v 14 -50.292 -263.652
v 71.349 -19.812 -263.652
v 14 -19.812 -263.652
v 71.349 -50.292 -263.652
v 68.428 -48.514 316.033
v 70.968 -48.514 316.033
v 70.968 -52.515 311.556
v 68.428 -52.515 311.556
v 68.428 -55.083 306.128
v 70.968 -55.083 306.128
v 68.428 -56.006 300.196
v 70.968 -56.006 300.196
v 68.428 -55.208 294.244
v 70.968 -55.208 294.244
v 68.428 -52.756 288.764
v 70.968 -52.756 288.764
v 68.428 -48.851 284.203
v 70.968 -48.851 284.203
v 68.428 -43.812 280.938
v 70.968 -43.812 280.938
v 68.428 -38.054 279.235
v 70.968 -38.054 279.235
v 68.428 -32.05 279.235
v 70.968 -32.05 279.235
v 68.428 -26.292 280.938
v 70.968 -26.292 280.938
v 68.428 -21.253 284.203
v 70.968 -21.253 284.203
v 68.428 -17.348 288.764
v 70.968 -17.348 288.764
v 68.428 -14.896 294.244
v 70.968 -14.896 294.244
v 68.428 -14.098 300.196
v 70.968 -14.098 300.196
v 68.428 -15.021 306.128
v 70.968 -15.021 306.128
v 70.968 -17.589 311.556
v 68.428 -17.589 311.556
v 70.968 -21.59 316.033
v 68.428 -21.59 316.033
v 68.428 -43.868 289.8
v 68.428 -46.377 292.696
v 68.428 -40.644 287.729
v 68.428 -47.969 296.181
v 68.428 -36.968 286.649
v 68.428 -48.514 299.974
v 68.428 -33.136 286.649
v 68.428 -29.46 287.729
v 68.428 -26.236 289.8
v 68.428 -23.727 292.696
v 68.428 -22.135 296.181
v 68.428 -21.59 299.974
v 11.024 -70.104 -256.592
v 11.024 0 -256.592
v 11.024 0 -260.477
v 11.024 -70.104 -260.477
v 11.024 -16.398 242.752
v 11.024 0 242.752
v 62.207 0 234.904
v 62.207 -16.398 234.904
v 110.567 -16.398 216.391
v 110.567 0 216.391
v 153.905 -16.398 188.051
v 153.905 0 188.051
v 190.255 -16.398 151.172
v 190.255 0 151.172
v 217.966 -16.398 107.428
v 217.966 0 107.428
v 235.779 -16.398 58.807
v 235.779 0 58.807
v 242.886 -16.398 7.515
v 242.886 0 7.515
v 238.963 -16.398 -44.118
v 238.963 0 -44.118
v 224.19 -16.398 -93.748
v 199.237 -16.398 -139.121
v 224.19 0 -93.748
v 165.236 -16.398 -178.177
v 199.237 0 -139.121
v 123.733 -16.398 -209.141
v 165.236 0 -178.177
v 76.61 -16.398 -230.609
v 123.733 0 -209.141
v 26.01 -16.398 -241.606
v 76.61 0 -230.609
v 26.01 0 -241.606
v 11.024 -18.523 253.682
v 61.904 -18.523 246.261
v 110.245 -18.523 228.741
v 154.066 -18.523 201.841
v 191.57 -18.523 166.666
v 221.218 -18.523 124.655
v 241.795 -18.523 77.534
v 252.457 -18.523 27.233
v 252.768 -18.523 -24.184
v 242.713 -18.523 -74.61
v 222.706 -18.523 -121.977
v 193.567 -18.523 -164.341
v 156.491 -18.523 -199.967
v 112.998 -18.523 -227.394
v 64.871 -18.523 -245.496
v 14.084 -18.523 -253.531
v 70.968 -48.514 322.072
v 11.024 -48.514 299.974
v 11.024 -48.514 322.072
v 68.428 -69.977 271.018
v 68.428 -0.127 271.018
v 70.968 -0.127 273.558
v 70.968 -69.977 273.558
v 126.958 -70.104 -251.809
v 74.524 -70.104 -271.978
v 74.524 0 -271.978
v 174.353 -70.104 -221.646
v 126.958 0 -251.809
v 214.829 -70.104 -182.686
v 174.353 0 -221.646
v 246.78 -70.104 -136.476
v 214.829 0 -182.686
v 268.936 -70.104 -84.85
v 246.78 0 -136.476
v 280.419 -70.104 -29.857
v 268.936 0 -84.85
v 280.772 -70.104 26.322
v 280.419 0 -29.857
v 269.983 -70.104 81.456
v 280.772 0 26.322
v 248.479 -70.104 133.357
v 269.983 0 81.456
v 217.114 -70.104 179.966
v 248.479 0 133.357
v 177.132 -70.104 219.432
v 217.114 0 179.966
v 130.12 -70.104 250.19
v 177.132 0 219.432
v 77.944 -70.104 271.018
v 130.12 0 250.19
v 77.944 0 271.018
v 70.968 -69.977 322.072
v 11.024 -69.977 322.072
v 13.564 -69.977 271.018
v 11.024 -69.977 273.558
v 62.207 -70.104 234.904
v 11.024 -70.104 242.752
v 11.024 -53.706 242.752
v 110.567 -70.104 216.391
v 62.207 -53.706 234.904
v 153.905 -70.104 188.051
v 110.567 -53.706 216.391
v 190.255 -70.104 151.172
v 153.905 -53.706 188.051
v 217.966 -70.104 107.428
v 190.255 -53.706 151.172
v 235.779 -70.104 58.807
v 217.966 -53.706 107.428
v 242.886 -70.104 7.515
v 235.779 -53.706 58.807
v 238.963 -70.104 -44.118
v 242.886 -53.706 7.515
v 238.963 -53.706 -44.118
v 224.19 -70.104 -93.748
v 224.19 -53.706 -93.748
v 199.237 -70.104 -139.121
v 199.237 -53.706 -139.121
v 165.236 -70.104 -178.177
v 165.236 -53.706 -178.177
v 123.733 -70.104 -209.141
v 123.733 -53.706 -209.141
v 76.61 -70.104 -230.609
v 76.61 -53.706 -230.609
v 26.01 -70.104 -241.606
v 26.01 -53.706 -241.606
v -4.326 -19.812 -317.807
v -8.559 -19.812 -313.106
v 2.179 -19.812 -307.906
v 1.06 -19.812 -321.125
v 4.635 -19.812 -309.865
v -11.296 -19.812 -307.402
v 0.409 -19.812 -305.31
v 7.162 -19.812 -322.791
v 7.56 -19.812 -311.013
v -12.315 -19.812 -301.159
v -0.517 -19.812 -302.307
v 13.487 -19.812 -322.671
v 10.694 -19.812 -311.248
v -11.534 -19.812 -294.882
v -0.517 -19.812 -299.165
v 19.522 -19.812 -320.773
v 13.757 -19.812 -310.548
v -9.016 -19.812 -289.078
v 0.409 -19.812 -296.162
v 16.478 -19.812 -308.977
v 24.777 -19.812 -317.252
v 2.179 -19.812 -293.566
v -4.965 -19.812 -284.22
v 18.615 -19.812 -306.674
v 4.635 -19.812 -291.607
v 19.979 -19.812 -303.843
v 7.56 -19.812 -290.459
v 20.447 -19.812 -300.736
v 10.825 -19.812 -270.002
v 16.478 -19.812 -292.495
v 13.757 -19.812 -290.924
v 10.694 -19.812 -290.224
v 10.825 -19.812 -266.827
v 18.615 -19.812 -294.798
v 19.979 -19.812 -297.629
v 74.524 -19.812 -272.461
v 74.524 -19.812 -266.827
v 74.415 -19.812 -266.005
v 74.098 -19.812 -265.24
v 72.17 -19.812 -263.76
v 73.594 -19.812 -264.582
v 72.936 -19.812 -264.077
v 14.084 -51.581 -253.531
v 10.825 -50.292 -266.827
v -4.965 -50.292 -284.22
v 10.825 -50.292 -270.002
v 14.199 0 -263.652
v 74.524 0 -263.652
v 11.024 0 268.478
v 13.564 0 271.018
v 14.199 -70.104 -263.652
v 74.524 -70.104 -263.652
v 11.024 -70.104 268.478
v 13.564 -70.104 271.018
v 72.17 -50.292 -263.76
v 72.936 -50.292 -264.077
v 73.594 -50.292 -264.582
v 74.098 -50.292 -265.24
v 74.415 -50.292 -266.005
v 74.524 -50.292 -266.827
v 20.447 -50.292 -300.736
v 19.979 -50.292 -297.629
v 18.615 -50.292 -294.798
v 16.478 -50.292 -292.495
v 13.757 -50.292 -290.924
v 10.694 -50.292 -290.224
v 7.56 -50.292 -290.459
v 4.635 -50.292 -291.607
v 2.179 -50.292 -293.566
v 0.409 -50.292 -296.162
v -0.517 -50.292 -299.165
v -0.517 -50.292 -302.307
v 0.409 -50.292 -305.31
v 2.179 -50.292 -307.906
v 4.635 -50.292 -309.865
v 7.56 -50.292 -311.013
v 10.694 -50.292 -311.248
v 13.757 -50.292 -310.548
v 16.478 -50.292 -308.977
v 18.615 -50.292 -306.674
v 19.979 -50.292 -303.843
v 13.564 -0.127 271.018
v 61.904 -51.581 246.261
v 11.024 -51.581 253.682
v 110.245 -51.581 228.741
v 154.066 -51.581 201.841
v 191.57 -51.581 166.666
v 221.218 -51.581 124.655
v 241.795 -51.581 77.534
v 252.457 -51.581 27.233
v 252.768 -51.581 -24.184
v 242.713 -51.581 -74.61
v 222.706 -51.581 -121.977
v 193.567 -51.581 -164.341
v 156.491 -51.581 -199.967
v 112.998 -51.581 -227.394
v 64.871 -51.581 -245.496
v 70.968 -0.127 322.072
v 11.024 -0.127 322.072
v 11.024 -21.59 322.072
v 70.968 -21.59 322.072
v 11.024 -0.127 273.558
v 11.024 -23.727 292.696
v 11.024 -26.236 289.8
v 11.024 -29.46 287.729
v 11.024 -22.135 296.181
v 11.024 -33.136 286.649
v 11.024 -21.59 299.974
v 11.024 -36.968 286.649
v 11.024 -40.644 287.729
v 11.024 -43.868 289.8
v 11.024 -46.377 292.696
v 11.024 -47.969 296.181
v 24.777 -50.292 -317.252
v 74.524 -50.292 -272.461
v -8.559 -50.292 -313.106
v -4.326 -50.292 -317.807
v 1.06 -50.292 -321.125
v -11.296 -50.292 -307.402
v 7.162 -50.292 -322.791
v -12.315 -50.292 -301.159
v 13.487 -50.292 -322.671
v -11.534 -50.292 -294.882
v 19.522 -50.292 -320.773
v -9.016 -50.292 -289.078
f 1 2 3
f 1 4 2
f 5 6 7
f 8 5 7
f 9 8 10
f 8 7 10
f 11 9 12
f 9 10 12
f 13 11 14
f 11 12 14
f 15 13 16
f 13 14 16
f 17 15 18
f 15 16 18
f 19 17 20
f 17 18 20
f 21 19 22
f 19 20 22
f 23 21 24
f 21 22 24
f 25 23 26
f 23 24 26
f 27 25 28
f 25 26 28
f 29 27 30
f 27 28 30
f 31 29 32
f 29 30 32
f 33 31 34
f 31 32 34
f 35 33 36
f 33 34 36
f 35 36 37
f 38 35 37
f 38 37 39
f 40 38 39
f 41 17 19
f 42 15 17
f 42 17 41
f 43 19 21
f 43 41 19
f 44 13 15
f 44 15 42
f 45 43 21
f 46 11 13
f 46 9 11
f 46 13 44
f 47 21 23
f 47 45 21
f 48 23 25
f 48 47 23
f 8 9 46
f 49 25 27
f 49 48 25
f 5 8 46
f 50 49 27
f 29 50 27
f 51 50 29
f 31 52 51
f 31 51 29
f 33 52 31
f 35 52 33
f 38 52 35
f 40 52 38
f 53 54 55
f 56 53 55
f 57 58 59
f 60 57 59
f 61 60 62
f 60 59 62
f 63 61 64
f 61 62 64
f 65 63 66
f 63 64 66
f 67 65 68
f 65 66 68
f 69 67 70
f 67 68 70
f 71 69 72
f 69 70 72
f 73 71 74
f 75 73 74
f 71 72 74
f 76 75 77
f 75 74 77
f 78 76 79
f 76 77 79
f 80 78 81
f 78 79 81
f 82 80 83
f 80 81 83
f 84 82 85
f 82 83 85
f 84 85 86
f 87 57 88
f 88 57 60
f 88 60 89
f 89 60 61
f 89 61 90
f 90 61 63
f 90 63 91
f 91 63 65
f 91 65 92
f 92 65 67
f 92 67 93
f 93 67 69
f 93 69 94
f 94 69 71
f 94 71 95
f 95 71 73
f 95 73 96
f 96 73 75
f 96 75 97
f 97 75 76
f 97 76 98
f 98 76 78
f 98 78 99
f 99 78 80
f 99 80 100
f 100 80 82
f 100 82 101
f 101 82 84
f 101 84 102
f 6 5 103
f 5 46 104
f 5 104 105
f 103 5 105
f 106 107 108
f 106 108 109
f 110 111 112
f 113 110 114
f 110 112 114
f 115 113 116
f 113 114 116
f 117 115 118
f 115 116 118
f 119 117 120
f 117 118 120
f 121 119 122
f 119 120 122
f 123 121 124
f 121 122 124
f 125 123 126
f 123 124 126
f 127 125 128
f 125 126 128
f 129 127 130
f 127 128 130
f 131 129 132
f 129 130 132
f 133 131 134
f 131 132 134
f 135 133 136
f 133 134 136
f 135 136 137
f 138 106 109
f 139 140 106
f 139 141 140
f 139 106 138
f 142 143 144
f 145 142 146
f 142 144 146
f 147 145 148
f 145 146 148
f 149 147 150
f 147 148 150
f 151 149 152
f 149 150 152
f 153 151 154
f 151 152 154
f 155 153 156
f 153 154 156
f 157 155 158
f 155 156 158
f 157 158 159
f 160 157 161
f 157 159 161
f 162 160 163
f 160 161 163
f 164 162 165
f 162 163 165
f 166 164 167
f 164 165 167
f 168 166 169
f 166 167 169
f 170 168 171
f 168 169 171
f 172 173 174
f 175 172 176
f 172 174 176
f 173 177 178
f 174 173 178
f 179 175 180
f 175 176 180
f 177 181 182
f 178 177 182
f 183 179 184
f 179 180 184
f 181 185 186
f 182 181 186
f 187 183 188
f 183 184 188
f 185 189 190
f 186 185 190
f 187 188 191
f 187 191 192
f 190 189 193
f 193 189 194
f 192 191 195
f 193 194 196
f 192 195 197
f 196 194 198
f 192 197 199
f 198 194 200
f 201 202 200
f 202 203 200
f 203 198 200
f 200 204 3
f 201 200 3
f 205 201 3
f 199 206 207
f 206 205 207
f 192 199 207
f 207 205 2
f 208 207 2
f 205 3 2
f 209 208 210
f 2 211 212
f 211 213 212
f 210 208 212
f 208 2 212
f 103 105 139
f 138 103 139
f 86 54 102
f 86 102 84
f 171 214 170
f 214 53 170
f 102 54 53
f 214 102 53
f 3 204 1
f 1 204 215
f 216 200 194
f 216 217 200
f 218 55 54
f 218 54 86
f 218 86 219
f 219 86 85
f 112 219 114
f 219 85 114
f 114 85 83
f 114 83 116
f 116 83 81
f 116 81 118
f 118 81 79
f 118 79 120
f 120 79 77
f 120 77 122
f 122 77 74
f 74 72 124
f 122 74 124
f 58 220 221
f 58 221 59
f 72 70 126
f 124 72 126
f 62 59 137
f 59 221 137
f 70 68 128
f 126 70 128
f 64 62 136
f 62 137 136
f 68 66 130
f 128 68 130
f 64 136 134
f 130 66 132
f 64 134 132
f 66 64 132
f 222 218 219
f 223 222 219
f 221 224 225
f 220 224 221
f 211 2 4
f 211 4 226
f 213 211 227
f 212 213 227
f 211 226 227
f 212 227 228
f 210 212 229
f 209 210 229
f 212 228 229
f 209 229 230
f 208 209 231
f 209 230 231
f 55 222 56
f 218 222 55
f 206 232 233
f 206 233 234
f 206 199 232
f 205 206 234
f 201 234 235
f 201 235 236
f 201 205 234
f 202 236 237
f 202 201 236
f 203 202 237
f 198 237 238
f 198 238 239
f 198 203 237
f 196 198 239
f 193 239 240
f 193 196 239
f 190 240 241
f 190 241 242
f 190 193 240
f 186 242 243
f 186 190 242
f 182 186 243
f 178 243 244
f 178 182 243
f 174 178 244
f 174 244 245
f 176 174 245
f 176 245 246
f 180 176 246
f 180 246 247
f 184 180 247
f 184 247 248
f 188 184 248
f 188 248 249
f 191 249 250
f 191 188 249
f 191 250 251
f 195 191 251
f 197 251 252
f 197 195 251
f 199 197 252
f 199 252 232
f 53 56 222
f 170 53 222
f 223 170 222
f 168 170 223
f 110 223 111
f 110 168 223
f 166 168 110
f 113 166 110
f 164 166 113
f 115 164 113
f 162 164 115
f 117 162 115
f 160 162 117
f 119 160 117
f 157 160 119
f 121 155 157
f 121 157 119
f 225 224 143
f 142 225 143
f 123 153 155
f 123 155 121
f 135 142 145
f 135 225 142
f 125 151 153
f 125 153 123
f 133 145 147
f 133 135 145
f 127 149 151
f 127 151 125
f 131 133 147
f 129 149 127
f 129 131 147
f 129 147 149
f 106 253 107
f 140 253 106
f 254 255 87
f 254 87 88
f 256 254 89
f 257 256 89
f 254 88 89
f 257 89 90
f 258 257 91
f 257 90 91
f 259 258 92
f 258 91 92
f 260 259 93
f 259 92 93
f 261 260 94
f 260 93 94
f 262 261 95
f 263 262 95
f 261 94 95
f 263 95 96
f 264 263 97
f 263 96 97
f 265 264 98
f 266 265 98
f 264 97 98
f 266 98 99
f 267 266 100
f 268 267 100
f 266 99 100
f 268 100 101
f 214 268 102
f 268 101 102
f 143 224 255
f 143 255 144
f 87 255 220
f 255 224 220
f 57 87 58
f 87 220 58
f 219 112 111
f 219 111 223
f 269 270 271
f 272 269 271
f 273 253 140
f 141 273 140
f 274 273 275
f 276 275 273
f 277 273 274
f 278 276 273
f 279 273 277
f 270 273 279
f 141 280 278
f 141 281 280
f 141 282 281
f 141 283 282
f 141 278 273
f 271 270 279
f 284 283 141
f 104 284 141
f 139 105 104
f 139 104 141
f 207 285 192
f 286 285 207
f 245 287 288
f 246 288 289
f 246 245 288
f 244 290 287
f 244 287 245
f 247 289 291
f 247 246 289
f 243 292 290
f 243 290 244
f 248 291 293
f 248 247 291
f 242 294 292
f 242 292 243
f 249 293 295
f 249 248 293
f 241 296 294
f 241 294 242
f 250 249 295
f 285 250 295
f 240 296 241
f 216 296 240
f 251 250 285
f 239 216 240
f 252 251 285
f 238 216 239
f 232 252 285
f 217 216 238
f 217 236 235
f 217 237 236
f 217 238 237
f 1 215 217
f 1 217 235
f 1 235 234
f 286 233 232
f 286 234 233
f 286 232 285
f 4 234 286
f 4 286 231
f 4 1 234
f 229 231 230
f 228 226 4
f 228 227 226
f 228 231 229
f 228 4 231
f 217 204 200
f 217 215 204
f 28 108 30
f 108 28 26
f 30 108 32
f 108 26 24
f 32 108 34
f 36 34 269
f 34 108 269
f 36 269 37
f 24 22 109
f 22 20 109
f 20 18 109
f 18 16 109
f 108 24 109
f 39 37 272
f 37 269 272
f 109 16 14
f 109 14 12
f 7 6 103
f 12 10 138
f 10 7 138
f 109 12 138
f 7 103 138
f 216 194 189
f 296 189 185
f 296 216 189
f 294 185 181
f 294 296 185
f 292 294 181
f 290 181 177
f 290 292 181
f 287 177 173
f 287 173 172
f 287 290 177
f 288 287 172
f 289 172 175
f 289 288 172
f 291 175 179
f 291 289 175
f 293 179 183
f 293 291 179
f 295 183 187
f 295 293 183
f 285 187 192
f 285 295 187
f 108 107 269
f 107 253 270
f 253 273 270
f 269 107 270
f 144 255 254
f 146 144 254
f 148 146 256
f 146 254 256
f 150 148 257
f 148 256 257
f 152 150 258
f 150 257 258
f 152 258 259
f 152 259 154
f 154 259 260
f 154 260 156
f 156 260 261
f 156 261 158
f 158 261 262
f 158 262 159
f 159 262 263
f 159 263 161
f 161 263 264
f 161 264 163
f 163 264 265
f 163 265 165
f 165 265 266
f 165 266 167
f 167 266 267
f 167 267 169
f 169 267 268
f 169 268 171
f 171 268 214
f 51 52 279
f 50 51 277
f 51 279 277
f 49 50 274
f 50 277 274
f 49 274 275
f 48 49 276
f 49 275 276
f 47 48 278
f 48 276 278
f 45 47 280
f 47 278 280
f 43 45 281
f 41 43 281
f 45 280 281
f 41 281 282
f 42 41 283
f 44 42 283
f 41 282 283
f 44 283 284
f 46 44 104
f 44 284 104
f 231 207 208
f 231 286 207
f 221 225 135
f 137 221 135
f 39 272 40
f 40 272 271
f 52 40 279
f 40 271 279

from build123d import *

# Parameters (mm, degrees)
F1_DEPTH  = 70.104
F4_W      = 165.1078228589
F4_H      = 35.960230231
F4_W_2    = 99.9321753113
F4_H_2    = 46.1589694023
F5_DEPTH  = 70.1050001
F6_W      = 69.85
F6_H      = 51.054
F7_DEPTH  = 59.944
F9_DEPTH  = 270.9809
F10_R     = 20.955
F11_DEPTH = 2.54
F13_R     = 10.541
F14_DEPTH = 15.24
F16_DEPTH = 70.1050001
F17_SIZE  = 2.54
F18_R     = 3.175
F19_SIZE  = 3.175
F20_SIZE  = 3.175
F21_SIZE  = 2.54


with BuildPart() as f1:
    # F0 (on Front) → F1 (new body)
    with BuildSketch(Plane.XZ):
        with BuildLine():
            Line((11.0236, -242.7516324276), (11.0236, -281.7879597415))
            ThreePointArc((11.0236, -281.7879597415), (282.0035, 0), (11.0236, 281.7879597415))
            Line((11.0236, 281.7879597415), (11.0236, 242.7516324276))
            ThreePointArc((11.0236, 242.7516324276), (243.0018, 0), (11.0236, -242.7516324276))
        make_face()
    extrude(amount=F1_DEPTH)

    # F2 (on face) → F3 (revolve, cut)
    with BuildSketch(Plane(origin=(11.0236, 0, 0), x_dir=(0, -1, 0), z_dir=(-1, 0, 0))):
        Polygon((18.52295, 253.6825), (16.3982045821, 242.7516324276), (53.7057954179, 242.7516324276), (51.58105, 253.6825), align=None)
    revolve(axis=Axis((0, -70.104, 0), (0, 1, 0)), mode=Mode.SUBTRACT)

    # F4 (on face) → F5 (cut, through all)
    with BuildSketch(Plane.XZ.offset(70.104)):
        with Locations((47.3792366683, 288.9981151155)):
            Rectangle(F4_W, F4_H)
        with Locations((24.5575123443, -286.7314847012)):
            Rectangle(F4_W_2, F4_H_2)
    extrude(amount=-F5_DEPTH, mode=Mode.SUBTRACT)

    # F15 (on face) → F16 (cut, through all)
    with BuildSketch(Plane.XZ.offset(70.104)):
        with BuildLine():
            Line((11.0236, -242.7516324276), (11.0236, -256.5918267325))
            Line((11.0236, -256.5918267325), (26.0096, -241.6058267325))
            ThreePointArc((26.0096, -241.6058267325), (18.5254606753, -242.2946184091), (11.0236, -242.7516324276))
        make_face()
    extrude(amount=-F16_DEPTH, mode=Mode.SUBTRACT)

    # F20
    f20_edges = [f1.edges().sort_by_distance(p)[0] for p in [
        (11.0236, -35.052, -263.652),
    ]]
    chamfer(f20_edges, length=F20_SIZE)

    # F21
    f21_edges = [f1.edges().sort_by_distance(p)[0] for p in [
        (11.0236, -35.052, 271.018),
    ]]
    chamfer(f21_edges, length=F21_SIZE)


with BuildPart() as f7:
    # F6 (on face) → F7 (new body)
    with BuildSketch(Plane(origin=(11.0236, 0, 0), x_dir=(0, -1, 0), z_dir=(-1, 0, 0))):
        with Locations((35.052, 296.545)):
            Rectangle(F6_W, F6_H)
    extrude(amount=-F7_DEPTH)

    # F8 (on face) → F9 (cut, through all)
    with BuildSketch(Plane(origin=(11.0236, 0, 0), x_dir=(0, -1, 0), z_dir=(-1, 0, 0))):
        with BuildLine():
            Line((21.59, 322.072), (21.59, 299.974))
            ThreePointArc((21.59, 299.974), (35.052, 286.512), (48.514, 299.974))
            Line((48.514, 299.974), (48.514, 322.072))
            Line((48.514, 322.072), (21.59, 322.072))
        make_face()
    extrude(amount=-F9_DEPTH, mode=Mode.SUBTRACT)

    # F10 (on face) → F11 (cut)
    with BuildSketch(Plane.YZ.offset(70.9676)):
        with Locations((-35.052, 299.974)):
            Circle(F10_R)
    extrude(amount=-F11_DEPTH, mode=Mode.SUBTRACT)

    # F17
    f17_edges = [f7.edges().sort_by_distance(p)[0] for p in [
        (70.9676, -35.052, 271.018),
        (11.0236, -35.052, 271.018),
    ]]
    chamfer(f17_edges, length=F17_SIZE)


with BuildPart() as f14:
    # F13 (on offset) → F14 (new body, symmetric)
    with BuildSketch(Plane.XZ.offset(35.052)):
        with BuildLine():
            Line((24.7774277263, -317.2523937462), (74.5236, -272.4607390427))
            Line((74.5236, -272.4607390427), (74.5236, -263.652))
            Line((74.5236, -263.652), (10.82482371, -263.652))
            Line((10.82482371, -263.652), (10.82482371, -270.002))
            Line((10.82482371, -270.002), (-4.9654277263, -284.2196062538))
            ThreePointArc((-4.9654277263, -284.2196062538), (-6.6103937462, -315.6074277263), (24.7774277263, -317.2523937462))
        make_face()
        with Locations((9.906, -300.736)):
            Circle(F13_R, mode=Mode.SUBTRACT)
    extrude(amount=F14_DEPTH, both=True)

    # F18
    f18_edges = [f14.edges().sort_by_distance(p)[0] for p in [
        (74.5236, -35.052, -263.652),
    ]]
    fillet(f18_edges, radius=F18_R)

    # F19
    f19_edges = [f14.edges().sort_by_distance(p)[0] for p in [
        (10.824824, -35.052, -263.652),
    ]]
    chamfer(f19_edges, length=F19_SIZE)


solid = Compound([f1.part, f7.part, f14.part])
